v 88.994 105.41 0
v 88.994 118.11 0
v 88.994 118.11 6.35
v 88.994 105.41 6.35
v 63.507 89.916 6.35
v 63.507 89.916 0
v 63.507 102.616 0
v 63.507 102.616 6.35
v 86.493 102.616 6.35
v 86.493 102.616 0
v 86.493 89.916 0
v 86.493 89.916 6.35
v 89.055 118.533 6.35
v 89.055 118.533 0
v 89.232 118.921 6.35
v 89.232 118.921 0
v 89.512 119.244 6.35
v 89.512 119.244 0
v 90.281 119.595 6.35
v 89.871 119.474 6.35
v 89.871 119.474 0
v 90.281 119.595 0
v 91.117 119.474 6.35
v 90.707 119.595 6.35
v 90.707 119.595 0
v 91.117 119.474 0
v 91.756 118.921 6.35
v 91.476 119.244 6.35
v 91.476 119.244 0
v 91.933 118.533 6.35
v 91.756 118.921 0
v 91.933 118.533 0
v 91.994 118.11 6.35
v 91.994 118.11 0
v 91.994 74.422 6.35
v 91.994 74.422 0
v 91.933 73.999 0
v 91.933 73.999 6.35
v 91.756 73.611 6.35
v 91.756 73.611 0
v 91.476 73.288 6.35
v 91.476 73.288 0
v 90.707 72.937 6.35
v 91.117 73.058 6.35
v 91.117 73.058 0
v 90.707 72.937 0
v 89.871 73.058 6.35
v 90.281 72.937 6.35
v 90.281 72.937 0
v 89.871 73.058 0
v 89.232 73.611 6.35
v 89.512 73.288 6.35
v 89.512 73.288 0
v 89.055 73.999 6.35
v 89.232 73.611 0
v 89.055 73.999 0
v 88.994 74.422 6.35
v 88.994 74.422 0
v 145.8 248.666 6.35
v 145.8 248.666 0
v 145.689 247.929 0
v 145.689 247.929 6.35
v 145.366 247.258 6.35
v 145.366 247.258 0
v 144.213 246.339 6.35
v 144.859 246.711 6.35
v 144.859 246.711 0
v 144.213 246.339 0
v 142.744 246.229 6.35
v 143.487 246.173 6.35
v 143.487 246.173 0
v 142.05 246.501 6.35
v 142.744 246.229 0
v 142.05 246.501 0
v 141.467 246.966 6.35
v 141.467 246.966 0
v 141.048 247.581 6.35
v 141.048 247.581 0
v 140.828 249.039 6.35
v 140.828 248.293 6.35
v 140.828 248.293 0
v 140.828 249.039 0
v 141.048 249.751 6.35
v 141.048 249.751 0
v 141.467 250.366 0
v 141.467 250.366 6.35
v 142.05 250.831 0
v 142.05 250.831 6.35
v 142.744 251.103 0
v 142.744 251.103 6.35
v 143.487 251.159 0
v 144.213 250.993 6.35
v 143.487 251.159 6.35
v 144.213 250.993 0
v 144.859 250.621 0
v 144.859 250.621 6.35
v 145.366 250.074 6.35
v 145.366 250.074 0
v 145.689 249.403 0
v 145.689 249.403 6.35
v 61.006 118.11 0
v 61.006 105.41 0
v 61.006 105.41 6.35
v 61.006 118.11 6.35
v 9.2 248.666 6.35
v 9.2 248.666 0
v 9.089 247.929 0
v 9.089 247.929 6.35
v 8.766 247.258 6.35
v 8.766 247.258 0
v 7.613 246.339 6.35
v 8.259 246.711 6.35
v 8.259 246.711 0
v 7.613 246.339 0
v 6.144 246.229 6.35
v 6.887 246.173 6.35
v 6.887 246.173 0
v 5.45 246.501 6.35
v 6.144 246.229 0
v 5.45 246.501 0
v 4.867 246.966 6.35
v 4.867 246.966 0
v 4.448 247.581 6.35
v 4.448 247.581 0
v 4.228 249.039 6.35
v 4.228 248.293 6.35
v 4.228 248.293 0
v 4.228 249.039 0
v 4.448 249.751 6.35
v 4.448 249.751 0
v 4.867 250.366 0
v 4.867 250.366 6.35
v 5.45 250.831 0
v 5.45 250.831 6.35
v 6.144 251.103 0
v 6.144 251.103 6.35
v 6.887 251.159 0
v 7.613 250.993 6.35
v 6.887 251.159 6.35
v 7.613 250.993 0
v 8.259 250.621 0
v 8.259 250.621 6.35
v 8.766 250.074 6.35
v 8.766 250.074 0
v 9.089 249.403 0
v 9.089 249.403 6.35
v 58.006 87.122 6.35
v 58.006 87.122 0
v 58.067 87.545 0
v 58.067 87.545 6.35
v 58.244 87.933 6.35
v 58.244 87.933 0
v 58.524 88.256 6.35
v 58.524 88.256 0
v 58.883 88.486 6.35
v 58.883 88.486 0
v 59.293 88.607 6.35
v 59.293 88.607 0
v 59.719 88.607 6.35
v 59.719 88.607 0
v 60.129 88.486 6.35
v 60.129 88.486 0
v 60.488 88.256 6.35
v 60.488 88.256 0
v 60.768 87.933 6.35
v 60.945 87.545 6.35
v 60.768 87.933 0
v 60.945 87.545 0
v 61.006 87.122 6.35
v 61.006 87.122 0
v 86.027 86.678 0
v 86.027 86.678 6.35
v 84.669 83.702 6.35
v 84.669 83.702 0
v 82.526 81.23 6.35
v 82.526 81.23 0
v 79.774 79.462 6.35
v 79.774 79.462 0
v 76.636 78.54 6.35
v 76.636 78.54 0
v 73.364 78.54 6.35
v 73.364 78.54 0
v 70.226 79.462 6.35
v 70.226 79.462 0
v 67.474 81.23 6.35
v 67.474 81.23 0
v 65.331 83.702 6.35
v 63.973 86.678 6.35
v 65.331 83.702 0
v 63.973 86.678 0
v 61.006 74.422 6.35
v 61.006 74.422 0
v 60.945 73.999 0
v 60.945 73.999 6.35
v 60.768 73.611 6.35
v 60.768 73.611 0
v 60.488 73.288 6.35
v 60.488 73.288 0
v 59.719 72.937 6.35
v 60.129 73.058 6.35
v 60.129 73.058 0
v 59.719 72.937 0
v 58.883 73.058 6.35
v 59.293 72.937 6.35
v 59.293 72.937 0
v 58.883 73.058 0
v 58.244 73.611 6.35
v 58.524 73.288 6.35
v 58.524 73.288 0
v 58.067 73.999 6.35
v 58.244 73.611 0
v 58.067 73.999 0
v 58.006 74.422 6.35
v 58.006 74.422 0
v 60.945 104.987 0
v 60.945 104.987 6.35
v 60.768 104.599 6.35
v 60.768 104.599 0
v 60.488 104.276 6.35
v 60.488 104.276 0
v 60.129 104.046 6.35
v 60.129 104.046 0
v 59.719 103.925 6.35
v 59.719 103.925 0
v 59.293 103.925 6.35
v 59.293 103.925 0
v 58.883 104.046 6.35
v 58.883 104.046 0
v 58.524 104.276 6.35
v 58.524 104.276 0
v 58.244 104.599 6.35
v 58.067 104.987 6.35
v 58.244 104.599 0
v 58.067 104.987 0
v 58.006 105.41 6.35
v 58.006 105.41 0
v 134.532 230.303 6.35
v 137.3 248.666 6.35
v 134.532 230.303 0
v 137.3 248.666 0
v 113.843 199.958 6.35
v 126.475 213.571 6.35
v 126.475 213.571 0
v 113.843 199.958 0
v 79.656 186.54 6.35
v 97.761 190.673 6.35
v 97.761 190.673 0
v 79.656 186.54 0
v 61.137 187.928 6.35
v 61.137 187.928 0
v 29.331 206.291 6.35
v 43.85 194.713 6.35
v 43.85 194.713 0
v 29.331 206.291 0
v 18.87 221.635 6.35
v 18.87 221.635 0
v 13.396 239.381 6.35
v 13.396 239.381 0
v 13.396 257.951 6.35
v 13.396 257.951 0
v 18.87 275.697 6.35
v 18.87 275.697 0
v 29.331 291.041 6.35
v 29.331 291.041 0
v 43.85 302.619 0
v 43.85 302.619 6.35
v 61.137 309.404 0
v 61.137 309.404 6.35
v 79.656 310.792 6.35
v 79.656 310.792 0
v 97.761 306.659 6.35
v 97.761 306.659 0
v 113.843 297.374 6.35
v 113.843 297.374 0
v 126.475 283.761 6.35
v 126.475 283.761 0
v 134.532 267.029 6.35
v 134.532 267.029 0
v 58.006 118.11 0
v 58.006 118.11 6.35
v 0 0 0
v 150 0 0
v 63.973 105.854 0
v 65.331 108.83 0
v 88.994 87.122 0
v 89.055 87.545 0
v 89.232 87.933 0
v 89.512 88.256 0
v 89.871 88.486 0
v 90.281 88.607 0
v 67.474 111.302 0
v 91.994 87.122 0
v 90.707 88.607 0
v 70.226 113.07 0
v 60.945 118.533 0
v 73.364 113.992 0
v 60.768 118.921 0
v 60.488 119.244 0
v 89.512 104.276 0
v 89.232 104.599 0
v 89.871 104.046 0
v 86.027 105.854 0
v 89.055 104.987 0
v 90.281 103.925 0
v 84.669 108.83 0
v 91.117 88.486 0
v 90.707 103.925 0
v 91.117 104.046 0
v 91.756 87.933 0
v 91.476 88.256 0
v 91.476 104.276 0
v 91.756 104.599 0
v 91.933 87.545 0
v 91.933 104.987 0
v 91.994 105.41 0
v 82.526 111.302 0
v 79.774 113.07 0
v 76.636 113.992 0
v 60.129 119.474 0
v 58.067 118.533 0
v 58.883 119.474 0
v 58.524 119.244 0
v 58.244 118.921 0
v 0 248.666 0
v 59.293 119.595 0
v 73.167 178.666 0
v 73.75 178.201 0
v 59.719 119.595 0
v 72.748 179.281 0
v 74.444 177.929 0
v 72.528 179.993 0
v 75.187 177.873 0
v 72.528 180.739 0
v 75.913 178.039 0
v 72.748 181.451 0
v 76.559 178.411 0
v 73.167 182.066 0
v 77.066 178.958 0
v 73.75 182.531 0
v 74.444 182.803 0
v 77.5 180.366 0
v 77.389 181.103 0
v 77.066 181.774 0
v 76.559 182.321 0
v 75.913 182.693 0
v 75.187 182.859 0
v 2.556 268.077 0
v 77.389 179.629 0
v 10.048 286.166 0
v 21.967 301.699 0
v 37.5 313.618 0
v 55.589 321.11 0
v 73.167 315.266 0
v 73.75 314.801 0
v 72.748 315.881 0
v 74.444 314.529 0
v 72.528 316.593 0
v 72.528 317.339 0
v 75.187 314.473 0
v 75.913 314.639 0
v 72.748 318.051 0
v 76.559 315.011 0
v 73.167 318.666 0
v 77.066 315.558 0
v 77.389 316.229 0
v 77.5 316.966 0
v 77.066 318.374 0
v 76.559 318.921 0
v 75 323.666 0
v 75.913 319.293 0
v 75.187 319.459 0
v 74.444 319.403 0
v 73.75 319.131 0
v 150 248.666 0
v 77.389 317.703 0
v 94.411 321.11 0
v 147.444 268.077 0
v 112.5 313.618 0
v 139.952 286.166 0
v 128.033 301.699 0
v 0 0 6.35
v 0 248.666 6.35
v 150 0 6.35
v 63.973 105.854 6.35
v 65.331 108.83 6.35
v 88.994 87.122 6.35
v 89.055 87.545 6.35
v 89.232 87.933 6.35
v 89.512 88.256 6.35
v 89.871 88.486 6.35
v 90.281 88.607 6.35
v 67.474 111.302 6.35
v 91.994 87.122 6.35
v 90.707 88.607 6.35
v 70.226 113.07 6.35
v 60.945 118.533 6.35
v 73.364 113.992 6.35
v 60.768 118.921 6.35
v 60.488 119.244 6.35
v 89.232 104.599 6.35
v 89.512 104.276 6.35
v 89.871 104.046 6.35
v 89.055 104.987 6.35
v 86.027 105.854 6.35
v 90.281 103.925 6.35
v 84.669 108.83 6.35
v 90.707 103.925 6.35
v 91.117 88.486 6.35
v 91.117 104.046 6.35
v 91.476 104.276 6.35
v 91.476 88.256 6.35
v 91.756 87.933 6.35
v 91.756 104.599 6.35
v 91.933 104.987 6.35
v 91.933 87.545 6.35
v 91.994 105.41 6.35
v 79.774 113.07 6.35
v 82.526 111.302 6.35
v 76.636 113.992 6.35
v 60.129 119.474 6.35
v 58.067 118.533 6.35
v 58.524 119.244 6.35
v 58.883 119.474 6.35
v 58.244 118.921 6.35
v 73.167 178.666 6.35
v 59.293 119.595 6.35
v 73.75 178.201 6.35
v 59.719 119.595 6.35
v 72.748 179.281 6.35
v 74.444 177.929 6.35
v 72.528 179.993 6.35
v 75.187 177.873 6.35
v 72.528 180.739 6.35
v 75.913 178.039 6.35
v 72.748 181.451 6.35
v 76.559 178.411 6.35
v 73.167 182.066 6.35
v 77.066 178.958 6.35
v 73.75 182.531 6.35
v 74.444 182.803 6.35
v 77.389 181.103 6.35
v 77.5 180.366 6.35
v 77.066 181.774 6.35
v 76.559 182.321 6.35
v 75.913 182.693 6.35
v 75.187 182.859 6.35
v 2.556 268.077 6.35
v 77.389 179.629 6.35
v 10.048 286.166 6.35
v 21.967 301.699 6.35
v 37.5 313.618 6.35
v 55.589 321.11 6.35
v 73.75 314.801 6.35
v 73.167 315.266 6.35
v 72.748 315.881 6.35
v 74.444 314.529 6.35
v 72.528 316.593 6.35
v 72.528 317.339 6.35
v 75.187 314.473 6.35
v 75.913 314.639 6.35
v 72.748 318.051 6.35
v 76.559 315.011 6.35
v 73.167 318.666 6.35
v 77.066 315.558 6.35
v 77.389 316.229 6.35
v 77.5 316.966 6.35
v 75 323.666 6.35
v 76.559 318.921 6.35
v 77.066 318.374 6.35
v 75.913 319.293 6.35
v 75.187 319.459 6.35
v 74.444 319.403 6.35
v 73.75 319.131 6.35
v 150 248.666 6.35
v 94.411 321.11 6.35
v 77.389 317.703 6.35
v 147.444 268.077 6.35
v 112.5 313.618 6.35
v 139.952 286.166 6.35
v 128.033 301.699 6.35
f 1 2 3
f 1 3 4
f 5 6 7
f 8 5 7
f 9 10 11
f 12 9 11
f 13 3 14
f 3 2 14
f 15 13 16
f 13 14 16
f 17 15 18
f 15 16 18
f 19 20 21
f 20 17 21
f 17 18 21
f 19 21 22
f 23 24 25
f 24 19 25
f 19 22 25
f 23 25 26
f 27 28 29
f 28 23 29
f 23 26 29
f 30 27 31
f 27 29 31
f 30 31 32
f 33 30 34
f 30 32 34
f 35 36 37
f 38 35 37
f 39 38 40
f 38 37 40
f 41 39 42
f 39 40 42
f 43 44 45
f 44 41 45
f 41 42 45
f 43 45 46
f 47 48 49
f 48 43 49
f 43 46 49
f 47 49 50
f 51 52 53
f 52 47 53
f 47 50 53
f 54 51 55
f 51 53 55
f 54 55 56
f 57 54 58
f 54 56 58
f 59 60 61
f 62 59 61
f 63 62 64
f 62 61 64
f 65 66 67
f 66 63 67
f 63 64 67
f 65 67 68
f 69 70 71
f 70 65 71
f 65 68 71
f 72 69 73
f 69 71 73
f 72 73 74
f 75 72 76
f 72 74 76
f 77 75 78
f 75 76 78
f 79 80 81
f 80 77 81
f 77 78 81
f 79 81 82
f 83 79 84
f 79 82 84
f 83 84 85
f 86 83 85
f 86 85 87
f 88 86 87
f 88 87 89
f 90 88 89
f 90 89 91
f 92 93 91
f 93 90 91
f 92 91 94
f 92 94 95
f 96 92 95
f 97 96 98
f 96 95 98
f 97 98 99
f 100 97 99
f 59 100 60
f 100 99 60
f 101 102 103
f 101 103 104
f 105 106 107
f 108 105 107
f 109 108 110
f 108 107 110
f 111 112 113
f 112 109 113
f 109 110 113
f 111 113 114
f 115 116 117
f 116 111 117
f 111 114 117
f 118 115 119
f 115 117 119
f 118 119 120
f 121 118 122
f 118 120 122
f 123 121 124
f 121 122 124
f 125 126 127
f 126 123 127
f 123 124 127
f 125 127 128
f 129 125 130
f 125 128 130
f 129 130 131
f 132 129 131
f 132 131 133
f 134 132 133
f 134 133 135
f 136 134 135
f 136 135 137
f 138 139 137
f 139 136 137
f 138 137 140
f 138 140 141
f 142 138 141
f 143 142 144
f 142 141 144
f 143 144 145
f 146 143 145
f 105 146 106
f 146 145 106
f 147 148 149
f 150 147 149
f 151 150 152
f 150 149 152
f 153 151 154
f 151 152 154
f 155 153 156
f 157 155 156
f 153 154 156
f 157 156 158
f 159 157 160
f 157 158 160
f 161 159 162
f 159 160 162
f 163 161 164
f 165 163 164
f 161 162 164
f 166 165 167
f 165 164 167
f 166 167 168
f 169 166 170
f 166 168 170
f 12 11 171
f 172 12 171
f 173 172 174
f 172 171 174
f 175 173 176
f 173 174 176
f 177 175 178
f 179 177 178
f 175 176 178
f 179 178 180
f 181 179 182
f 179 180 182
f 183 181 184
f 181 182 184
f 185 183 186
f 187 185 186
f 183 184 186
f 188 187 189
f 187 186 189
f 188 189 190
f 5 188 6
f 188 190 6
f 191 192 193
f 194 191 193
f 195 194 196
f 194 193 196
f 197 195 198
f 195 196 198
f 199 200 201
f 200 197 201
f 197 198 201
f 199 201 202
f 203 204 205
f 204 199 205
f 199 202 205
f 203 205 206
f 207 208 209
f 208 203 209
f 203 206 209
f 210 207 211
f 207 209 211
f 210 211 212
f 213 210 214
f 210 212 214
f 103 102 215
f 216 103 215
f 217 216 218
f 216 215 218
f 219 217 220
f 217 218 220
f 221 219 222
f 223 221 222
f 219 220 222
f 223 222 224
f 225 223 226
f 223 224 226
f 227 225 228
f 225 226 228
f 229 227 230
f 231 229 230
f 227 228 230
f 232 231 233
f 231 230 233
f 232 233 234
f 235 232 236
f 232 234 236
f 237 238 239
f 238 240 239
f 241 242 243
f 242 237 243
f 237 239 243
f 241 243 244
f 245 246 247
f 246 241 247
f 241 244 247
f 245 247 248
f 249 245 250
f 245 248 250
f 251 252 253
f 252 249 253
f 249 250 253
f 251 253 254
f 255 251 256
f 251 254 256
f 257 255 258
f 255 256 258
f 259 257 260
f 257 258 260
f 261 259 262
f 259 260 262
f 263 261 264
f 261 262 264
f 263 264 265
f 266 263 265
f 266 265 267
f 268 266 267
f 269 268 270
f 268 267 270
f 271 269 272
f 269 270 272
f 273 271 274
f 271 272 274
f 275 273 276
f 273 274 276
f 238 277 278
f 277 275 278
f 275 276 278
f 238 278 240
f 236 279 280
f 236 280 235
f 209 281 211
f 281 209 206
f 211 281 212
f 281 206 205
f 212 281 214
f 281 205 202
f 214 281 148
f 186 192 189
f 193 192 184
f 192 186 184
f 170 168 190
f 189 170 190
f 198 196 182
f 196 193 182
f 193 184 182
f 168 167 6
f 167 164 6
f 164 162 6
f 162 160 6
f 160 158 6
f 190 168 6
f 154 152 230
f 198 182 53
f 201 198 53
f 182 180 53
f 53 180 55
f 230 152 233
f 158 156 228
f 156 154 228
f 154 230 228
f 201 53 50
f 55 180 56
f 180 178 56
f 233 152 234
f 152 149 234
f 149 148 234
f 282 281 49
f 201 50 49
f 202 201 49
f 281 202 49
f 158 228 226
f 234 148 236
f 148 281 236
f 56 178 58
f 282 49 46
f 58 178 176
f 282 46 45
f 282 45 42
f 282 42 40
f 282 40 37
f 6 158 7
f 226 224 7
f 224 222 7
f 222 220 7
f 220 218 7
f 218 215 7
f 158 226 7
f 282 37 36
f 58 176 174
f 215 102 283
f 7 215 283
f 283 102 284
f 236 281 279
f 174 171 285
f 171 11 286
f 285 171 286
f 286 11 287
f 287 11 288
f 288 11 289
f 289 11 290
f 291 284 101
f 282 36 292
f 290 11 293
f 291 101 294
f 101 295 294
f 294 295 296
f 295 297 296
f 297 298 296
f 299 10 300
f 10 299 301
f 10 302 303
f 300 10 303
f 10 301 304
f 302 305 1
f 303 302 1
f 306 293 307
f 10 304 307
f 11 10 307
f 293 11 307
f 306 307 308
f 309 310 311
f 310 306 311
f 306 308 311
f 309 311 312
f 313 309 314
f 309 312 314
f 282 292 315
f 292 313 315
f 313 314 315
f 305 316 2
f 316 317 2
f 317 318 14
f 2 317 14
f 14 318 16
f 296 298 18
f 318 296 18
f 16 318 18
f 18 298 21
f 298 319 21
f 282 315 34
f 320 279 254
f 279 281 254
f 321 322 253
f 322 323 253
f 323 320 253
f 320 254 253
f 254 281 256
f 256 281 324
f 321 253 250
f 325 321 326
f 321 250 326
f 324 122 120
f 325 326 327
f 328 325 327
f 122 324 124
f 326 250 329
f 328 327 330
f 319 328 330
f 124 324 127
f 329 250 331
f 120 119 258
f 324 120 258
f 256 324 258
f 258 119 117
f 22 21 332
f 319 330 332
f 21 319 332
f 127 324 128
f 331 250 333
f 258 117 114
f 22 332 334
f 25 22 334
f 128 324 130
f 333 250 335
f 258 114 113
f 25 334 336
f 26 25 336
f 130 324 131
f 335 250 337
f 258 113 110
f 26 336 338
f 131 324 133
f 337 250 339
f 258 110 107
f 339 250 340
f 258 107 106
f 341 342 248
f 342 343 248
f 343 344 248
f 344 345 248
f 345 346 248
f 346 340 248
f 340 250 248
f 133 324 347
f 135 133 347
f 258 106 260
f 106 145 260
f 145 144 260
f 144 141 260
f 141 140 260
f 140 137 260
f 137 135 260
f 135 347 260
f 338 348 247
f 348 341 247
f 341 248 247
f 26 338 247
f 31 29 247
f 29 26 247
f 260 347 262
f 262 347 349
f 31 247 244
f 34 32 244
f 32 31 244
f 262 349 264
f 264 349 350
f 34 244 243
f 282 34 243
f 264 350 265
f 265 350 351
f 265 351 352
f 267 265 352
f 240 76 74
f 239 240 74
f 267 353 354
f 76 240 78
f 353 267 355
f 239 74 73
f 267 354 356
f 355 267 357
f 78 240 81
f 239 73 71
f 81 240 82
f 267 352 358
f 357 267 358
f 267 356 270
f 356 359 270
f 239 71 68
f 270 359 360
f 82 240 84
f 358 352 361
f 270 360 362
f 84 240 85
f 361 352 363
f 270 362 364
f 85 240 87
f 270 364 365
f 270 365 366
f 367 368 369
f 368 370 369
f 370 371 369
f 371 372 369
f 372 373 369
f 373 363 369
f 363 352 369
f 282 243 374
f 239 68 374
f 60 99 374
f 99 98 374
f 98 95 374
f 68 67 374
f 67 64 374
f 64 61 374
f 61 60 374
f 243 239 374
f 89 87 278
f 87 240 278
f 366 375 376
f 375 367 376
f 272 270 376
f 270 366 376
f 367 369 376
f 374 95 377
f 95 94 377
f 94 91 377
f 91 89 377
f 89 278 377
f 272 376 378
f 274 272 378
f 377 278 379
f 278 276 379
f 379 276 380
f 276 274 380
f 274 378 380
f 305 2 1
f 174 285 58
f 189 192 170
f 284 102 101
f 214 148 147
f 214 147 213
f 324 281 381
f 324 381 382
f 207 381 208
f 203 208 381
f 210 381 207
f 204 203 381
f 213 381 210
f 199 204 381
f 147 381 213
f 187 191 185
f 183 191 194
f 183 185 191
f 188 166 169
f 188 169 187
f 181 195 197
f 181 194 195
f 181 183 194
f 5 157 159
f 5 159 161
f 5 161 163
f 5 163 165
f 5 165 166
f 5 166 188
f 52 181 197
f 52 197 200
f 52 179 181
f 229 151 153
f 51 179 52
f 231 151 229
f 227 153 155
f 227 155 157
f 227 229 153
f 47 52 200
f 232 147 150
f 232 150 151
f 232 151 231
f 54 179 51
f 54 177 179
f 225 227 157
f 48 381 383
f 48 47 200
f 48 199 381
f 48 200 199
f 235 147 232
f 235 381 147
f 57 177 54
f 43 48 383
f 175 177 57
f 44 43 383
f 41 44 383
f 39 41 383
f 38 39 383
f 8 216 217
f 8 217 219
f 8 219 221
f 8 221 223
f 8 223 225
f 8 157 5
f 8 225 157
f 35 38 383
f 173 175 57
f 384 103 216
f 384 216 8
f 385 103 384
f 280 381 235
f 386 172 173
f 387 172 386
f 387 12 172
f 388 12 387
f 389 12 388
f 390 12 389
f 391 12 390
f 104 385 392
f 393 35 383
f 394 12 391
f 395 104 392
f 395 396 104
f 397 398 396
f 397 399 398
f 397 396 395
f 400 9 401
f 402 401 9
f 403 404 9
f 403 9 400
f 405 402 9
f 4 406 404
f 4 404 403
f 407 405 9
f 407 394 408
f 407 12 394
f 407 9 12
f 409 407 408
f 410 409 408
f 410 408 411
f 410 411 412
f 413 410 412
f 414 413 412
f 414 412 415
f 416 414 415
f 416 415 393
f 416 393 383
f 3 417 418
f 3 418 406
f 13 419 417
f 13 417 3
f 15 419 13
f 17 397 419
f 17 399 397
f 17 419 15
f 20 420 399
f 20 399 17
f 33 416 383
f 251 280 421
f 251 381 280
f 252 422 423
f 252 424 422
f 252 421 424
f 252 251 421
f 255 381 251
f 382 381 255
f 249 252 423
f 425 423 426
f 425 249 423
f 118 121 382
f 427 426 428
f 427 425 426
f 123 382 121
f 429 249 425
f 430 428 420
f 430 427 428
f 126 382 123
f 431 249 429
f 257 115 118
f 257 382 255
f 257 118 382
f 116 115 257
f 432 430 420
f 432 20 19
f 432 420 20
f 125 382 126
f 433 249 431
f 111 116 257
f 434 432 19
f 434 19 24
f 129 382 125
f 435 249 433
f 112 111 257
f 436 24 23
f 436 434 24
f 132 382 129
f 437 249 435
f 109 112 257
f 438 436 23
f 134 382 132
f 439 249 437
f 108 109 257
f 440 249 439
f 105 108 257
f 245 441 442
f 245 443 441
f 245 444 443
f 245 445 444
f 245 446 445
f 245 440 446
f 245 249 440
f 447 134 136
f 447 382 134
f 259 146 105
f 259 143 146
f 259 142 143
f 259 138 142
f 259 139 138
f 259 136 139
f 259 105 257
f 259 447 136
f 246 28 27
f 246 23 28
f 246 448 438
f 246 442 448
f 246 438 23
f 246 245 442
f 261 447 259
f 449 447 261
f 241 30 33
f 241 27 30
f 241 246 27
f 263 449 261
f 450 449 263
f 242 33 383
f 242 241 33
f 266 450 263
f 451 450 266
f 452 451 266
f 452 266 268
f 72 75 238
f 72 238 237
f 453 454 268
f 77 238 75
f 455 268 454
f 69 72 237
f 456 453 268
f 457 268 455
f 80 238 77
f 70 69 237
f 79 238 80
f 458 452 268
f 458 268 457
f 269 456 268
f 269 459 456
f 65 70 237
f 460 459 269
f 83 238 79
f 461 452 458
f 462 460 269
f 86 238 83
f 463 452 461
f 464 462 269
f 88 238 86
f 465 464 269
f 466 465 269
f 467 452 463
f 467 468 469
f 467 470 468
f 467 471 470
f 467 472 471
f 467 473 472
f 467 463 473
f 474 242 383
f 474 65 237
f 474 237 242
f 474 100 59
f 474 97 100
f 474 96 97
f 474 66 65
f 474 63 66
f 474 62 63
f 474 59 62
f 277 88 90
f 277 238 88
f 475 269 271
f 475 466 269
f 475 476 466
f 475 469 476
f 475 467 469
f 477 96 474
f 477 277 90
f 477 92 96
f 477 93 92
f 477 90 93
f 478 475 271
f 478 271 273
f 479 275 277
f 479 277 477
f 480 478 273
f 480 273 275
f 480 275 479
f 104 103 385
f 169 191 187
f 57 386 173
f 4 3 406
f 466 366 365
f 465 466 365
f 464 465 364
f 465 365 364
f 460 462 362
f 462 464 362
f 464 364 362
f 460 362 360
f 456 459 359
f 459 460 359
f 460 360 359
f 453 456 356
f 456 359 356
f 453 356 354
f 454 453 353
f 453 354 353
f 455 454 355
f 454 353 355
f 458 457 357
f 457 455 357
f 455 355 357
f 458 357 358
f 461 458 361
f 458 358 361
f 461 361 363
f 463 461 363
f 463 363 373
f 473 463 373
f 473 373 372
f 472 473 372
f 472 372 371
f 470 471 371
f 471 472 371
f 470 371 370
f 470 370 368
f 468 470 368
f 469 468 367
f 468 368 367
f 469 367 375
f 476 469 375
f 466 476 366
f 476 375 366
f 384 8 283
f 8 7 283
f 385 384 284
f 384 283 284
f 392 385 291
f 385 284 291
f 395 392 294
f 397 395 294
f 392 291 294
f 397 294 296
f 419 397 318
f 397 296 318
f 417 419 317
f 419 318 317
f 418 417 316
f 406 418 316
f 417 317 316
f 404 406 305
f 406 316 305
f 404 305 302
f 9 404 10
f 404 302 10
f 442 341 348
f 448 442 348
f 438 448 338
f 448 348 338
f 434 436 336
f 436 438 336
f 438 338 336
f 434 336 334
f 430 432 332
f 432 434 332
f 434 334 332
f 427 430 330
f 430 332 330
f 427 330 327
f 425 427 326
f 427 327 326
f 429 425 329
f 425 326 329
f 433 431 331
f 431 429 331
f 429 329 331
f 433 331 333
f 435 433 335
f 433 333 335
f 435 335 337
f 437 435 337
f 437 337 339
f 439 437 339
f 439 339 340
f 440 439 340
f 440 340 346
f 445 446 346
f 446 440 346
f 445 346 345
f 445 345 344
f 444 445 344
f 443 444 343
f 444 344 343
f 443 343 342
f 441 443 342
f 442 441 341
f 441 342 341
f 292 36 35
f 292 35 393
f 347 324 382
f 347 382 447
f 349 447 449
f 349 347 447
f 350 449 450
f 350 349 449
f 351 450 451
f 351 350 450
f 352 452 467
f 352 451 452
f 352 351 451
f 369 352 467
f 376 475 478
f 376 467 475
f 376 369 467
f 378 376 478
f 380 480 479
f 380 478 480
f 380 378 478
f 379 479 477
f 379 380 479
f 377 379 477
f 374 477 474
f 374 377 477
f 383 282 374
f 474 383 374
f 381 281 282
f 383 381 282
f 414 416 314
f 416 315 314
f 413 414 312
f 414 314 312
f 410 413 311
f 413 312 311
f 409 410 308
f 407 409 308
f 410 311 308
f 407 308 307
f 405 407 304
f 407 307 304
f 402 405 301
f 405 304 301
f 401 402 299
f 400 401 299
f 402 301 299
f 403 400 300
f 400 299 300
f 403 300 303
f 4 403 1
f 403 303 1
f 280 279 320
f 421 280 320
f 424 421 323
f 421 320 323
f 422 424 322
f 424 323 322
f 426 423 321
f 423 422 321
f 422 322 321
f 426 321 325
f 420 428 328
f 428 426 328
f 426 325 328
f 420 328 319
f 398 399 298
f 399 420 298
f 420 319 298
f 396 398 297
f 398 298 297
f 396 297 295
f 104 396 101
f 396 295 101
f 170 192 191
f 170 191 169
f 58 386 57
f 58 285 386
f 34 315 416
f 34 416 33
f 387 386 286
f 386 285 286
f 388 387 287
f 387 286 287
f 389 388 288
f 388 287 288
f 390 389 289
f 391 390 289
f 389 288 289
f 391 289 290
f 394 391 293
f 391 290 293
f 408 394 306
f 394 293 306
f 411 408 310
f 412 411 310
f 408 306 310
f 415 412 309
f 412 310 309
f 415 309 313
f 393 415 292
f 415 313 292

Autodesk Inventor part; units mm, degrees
ref_plane "YZ Plane" through (0, 0, 0) normal (1, 0, 0) x (0, 1, 0)
ref_plane "XZ Plane" through (0, 0, 0) normal (0, 1, 0) x (-1, 0, 0)
ref_plane "XY Plane" through (0, 0, 0) normal (0, 0, 1) x (1, 0, 0)
ref_plane "Work Plane1" through (0, 0, 0) normal (0, 0, 1) x (1, 0, 0)
sketch "Sketch1" plane through (0, 0, 0) normal (0, 0, 1) x (1, 0, 0)
  line L0 (0, 0) -> (150, 0) projected
  line L1 (150, 0) -> (150, 6.35) projected
  line L2 (0, 6.35) -> (150, 6.35) projected
  line L3 (0, 0) -> (0, 6.35) projected
  line L4 (-41.185, 45.466) -> (-34.327, 45.466) projected
  line L5 (0, 6.35) -> (0, 45.466)
  line L6 (150, 6.35) -> (150, 45.466)
  line L7 (0, 45.466) -> (150, 45.466) construction
  line L8 (75, 45.466) -> (75, 96.266) construction
  line L9 (75, 96.266) -> (75, 248.666) construction
  line L10 (59.506, 80.772) -> (90.494, 80.772)
  line L11 (90.494, 80.772) -> (90.494, 111.76)
  line L12 (90.494, 111.76) -> (59.506, 111.76)
  line L13 (59.506, 111.76) -> (59.506, 80.772)
  line L14 (59.506, 80.772) -> (90.494, 111.76) construction
  line L15 (90.494, 80.772) -> (59.506, 111.76) construction
  line L16 (90.494, 118.11) -> (90.494, 105.41) construction
  line L17 (88.994, 118.11) -> (88.994, 105.41)
  line L18 (91.994, 105.41) -> (91.994, 118.11)
  arc A0 (91.994, 118.11) -> (88.994, 118.11) centre (90.494, 118.11) ccw
  arc A1 (88.994, 105.41) -> (91.994, 105.41) centre (90.494, 105.41) ccw
  line L19 (90.494, 74.422) -> (90.494, 87.122) construction
  line L20 (91.994, 74.422) -> (91.994, 87.122)
  line L21 (88.994, 87.122) -> (88.994, 74.422)
  arc A2 (88.994, 74.422) -> (91.994, 74.422) centre (90.494, 74.422) ccw
  arc A3 (91.994, 87.122) -> (88.994, 87.122) centre (90.494, 87.122) ccw
  line L22 (59.506, 105.41) -> (59.506, 118.11) construction
  line L23 (61.006, 105.41) -> (61.006, 118.11)
  line L24 (58.006, 118.11) -> (58.006, 105.41)
  arc A4 (58.006, 105.41) -> (61.006, 105.41) centre (59.506, 105.41) ccw
  arc A5 (61.006, 118.11) -> (58.006, 118.11) centre (59.506, 118.11) ccw
  line L25 (59.506, 74.422) -> (59.506, 87.122) construction
  line L26 (61.006, 74.422) -> (61.006, 87.122)
  line L27 (58.006, 87.122) -> (58.006, 74.422)
  arc A6 (58.006, 74.422) -> (61.006, 74.422) centre (59.506, 74.422) ccw
  arc A7 (61.006, 87.122) -> (58.006, 87.122) centre (59.506, 87.122) ccw
  line L28 (0, 45.466) -> (0, 248.666)
  line L29 (150, 45.466) -> (150, 248.666)
  circle A8 centre (75, 248.666) radius 75
  circle A9 centre (75, 316.966) radius 5.1943 projected
  circle A10 centre (6.7, 248.666) radius 5.1943 projected
  circle A11 centre (75, 180.366) radius 5.1943 projected
  circle A12 centre (143.3, 248.666) radius 5.1943 projected
  circle A13 centre (75, 248.666) radius 74.3 projected
  circle A14 centre (75, 248.666) radius 62.3 projected
  circle A15 centre (143.3, 248.666) radius 2.5
  circle A16 centre (75, 316.966) radius 2.5
  circle A17 centre (6.7, 248.666) radius 2.5
  circle A18 centre (75, 180.366) radius 2.5
  circle A19 centre (75, 96.266) radius 11.493 construction
  line L30 (75, 89.916) -> (75, 102.616) construction
  line L31 (63.507, 89.916) -> (63.507, 102.616)
  line L32 (86.493, 102.616) -> (86.493, 89.916)
  arc A20 (63.507, 89.916) -> (86.493, 89.916) centre (75, 89.916) ccw
  arc A21 (86.493, 102.616) -> (63.507, 102.616) centre (75, 102.616) ccw
  dimension "d0" = 50.8
  dimension "d1" = 152.4
  dimension "d2" = 30.988
  dimension "d3" = 30.988
  dimension "d4" = 6.35
  dimension "d5" = 3
  dimension "d6" = 6.35
  dimension "d7" = 3
  dimension "d8" = 6.35
  dimension "d9" = 3
  dimension "d10" = 6.35
  dimension "d11" = 3
  dimension "d14" = 5
  dimension "d17" = 360
  dimension "d19" = 6.35
extrude "Extrusion1" add sketch "Sketch1" along normal blind 6.35 contours L3 L2 L1 L0 | L5 L28 A8 L29 L6 L2 | A8 | L26 A7 L13 A4 L23 L12 A21 L31 A20 L10 | A20 L32 A21 L12 L17 A1 L11 A3 L21 L10 | A9 | A10 | A11 | A12 | A13
properties part number "SideBoard"
